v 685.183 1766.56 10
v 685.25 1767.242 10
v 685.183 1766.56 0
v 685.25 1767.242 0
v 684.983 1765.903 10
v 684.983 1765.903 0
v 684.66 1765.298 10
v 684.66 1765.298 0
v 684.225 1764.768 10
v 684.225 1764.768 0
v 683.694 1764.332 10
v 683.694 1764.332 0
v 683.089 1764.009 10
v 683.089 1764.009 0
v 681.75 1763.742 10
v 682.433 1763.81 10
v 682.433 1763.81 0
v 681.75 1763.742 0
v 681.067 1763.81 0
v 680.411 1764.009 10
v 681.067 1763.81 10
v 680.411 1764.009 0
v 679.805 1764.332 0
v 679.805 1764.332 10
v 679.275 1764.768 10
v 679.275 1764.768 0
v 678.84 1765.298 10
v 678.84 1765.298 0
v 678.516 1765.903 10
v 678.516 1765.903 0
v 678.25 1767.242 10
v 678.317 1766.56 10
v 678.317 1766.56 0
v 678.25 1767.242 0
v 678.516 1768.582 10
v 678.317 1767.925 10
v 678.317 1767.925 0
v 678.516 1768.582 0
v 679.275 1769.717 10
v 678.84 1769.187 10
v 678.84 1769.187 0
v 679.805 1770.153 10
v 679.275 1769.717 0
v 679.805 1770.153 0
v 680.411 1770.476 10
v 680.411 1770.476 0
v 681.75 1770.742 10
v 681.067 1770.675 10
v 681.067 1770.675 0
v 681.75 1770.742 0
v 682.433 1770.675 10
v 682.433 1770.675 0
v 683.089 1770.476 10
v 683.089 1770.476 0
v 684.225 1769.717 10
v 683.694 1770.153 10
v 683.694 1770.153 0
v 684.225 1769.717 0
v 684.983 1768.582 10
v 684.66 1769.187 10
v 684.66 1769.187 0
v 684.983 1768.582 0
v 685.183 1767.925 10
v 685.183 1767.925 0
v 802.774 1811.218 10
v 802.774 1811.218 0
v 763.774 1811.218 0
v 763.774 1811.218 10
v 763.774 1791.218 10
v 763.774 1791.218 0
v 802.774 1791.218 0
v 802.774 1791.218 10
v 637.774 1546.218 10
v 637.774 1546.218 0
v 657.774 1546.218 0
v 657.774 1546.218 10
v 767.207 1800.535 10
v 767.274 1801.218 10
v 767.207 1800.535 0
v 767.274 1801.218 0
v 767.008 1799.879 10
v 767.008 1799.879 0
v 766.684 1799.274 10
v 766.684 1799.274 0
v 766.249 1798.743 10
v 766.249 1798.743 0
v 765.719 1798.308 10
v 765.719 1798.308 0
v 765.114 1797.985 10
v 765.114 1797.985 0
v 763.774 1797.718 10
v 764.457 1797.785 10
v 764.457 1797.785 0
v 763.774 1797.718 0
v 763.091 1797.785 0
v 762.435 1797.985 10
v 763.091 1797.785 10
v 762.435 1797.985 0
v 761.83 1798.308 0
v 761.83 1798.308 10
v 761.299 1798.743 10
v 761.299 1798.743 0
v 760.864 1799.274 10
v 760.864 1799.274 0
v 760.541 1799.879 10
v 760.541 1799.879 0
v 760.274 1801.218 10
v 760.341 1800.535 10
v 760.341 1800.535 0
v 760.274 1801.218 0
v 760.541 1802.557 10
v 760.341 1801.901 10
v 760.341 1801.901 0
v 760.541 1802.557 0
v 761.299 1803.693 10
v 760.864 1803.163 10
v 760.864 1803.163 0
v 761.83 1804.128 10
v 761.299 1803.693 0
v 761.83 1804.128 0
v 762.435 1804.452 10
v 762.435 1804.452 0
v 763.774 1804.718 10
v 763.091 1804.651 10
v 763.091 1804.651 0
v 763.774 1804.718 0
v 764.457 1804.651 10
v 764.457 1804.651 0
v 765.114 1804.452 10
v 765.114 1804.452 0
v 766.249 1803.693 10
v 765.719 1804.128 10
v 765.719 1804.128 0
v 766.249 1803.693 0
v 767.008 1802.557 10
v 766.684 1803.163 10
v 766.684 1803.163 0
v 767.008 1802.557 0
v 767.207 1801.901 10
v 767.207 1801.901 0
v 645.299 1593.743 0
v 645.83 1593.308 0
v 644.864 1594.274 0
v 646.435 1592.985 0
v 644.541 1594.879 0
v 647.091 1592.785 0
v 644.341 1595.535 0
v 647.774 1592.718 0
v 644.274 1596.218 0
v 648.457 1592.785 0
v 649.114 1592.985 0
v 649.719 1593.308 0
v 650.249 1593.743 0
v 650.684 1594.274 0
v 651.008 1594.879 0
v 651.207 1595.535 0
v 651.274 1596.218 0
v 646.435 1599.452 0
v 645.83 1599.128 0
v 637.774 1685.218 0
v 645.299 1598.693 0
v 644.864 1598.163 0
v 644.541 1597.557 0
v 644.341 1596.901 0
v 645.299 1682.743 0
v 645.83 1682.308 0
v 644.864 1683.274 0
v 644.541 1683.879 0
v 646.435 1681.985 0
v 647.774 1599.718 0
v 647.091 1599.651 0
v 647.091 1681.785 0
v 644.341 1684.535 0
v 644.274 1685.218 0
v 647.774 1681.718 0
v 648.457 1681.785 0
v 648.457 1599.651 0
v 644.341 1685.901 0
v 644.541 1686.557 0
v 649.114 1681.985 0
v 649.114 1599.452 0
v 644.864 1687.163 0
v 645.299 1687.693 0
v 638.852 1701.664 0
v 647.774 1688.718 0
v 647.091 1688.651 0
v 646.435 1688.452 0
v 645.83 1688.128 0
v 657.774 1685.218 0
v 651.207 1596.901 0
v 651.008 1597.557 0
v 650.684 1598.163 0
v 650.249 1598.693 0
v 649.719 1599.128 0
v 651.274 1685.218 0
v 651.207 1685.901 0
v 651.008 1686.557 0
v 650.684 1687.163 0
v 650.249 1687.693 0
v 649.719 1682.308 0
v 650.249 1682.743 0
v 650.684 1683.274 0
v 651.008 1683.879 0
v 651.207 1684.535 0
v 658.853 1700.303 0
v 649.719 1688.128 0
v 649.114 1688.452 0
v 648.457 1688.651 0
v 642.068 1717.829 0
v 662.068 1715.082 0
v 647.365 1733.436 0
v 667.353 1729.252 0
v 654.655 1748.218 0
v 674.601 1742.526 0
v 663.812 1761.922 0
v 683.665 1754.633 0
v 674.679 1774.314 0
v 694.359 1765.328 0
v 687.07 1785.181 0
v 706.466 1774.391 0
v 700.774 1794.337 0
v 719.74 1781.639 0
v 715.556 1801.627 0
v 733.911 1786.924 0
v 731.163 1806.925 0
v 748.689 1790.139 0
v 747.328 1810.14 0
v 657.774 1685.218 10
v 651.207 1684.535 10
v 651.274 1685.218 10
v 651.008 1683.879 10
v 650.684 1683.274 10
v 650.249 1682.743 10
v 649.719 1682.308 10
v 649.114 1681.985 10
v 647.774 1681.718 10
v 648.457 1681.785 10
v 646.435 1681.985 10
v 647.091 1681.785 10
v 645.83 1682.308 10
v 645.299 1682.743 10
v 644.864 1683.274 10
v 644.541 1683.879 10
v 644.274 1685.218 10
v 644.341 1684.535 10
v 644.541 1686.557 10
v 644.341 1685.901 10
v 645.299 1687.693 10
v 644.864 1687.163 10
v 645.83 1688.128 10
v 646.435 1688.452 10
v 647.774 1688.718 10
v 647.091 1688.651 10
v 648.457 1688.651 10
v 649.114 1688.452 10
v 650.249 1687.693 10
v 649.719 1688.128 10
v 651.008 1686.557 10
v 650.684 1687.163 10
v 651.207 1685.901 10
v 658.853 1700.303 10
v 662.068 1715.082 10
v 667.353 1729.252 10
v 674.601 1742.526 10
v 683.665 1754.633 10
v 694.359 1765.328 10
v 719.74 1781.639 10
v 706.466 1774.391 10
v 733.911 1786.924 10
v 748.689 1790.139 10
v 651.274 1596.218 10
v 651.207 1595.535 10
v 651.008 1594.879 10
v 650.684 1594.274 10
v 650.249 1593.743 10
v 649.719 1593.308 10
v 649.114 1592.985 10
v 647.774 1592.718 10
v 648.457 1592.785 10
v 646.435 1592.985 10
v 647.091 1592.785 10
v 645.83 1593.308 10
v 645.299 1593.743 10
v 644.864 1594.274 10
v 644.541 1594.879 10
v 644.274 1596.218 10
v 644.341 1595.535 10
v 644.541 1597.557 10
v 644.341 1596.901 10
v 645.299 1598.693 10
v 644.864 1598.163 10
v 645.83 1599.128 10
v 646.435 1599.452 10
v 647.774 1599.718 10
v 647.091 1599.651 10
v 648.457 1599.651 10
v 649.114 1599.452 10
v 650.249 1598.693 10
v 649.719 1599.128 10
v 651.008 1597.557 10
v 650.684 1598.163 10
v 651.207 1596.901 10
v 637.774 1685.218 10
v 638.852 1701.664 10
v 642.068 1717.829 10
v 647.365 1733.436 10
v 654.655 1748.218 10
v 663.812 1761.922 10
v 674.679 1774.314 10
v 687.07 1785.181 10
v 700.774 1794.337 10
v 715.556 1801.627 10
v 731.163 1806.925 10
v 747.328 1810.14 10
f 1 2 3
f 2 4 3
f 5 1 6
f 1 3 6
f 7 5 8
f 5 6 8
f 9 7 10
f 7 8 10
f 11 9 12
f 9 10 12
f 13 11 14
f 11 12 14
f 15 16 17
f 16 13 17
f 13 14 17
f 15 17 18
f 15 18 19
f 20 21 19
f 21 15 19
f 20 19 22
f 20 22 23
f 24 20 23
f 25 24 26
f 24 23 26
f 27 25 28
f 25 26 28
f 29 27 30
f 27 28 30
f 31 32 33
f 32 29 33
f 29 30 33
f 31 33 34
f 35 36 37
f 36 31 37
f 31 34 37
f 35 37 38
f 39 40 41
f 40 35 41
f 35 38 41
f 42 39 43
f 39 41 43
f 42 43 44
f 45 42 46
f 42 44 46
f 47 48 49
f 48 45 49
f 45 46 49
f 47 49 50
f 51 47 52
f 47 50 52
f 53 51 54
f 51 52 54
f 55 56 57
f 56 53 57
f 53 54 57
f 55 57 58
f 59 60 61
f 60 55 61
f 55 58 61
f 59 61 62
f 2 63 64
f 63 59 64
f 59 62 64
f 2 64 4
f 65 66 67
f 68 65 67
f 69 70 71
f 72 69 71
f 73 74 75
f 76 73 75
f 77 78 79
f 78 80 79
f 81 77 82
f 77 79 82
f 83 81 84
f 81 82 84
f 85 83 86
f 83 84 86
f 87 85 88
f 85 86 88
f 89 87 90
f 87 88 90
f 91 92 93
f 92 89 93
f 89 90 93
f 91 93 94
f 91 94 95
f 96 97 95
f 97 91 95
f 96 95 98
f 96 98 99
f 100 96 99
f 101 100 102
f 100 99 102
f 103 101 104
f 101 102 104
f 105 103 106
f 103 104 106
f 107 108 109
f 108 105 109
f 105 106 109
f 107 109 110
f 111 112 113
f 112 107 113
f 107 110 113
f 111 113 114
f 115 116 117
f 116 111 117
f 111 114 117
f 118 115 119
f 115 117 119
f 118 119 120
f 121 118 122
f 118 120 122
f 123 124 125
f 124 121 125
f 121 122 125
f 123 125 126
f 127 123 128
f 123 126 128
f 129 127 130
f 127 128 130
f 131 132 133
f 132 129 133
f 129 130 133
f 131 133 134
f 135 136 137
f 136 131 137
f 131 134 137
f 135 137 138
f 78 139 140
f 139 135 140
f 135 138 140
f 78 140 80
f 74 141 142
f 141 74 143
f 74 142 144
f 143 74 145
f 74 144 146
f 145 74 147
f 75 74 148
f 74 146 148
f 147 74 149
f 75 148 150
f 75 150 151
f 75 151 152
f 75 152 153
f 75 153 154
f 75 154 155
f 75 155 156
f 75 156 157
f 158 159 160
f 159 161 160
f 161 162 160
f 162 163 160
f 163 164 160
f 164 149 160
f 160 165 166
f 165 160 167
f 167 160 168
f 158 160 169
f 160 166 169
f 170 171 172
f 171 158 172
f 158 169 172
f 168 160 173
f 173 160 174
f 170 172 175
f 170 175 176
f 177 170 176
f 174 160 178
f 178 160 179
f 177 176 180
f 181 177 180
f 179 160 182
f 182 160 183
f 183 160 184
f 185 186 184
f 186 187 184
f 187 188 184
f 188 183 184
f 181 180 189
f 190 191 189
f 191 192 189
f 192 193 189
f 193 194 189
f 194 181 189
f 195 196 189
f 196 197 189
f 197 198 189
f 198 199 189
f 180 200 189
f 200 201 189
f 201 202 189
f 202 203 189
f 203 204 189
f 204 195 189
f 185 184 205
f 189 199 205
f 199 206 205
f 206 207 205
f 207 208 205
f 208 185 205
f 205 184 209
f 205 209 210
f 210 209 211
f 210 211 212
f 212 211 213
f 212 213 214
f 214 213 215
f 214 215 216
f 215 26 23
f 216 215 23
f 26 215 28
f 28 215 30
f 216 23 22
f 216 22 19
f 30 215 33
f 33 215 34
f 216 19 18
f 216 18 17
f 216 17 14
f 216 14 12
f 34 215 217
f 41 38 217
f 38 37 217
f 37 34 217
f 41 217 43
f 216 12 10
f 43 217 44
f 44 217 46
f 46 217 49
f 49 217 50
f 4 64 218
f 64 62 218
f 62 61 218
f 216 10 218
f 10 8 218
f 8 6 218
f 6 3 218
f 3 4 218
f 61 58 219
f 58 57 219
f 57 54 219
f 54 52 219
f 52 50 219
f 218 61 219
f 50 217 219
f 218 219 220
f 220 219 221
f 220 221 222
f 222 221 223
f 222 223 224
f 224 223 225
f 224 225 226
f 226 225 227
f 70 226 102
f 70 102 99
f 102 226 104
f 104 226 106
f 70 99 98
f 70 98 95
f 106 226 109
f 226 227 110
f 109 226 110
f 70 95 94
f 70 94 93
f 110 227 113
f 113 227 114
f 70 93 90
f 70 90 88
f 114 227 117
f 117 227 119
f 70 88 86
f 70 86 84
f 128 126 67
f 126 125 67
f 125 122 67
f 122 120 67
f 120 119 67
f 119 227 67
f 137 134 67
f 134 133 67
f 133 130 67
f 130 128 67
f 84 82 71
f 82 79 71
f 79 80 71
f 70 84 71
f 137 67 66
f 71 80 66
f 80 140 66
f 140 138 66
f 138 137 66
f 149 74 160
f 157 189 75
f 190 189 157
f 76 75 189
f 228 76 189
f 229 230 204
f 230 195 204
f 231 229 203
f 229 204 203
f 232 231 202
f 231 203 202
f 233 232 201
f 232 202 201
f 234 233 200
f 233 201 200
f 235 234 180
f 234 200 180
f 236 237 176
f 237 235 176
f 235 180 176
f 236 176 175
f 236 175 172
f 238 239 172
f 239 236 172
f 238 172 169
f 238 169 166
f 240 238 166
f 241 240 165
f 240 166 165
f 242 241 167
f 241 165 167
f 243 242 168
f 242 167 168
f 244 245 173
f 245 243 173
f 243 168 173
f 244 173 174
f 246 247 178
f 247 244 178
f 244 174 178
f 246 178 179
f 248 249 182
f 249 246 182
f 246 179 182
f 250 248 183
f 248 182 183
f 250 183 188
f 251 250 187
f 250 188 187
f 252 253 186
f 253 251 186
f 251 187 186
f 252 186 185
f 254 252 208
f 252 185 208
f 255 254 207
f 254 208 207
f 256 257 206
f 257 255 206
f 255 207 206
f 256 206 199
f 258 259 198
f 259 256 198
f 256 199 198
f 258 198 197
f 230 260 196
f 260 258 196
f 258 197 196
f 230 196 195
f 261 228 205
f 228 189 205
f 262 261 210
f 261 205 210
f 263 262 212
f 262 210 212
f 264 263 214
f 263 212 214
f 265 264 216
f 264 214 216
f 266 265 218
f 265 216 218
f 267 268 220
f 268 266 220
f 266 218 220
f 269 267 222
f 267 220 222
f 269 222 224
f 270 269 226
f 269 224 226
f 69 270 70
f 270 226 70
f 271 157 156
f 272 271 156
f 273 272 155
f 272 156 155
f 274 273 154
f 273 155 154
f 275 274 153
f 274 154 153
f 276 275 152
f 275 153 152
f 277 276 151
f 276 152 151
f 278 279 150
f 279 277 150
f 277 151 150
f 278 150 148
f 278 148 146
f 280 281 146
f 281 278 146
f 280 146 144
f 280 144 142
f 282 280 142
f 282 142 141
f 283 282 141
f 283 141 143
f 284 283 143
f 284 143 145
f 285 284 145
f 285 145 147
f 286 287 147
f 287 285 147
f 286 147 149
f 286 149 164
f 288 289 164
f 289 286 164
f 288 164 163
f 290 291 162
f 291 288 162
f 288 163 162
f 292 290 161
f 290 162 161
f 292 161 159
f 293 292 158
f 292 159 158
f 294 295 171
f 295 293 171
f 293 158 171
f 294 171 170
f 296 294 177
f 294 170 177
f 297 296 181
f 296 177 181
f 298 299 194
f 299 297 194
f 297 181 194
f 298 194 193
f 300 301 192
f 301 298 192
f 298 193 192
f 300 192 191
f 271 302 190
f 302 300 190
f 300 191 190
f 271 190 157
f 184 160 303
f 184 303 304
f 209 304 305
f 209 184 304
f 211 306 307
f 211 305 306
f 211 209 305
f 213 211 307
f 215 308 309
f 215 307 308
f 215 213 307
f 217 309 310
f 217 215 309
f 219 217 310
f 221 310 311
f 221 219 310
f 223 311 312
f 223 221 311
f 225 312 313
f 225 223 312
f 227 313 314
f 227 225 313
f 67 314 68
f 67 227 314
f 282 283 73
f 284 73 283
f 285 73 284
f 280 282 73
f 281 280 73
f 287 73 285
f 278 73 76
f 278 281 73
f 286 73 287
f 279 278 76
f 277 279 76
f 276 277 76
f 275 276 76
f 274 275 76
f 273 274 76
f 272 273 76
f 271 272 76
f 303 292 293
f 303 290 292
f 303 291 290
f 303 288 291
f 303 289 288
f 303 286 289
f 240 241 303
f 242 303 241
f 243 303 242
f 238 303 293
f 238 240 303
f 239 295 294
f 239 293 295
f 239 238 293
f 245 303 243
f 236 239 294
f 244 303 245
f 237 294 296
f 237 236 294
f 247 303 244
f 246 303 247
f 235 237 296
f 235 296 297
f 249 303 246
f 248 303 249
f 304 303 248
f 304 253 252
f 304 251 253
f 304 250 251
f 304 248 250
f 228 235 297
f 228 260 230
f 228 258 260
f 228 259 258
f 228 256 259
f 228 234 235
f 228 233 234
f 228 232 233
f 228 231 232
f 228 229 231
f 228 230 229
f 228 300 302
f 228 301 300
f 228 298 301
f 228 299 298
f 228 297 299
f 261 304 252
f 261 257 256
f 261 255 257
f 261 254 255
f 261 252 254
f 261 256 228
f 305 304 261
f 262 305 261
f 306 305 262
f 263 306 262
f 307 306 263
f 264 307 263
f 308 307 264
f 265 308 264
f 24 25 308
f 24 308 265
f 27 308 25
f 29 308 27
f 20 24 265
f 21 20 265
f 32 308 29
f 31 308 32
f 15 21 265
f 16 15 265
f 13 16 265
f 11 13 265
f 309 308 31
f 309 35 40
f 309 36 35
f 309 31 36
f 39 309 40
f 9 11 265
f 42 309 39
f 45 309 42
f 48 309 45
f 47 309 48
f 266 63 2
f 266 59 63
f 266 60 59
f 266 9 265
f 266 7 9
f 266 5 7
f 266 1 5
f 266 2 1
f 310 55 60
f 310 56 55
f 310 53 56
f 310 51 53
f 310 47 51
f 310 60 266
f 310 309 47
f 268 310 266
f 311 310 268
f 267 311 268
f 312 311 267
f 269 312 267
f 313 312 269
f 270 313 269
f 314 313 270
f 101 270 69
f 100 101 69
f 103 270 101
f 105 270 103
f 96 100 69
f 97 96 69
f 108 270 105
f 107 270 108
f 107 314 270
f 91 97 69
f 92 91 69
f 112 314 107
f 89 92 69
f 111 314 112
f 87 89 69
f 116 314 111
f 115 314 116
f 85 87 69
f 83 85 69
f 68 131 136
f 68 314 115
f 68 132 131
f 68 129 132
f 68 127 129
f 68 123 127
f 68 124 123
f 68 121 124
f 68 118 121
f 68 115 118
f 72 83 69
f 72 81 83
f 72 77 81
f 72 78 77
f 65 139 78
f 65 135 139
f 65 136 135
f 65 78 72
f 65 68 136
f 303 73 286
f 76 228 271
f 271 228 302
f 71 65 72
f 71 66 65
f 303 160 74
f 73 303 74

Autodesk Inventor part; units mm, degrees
ref_plane "YZ Plane" through (0, 0, 0) normal (1, 0, 0) x (0, 1, 0)
ref_plane "XZ Plane" through (0, 0, 0) normal (0, 1, 0) x (-1, 0, 0)
ref_plane "XY Plane" through (0, 0, 0) normal (0, 0, 1) x (1, 0, 0)
sketch "Sketch1" plane through (0, 0, 0) normal (0, 0, 1) x (1, 0, 0)
  arc A0 (763.7742, 1811.2181) -> (637.7742, 1685.2181) centre (763.7742, 1685.2181) ccw
  arc A1 (763.7742, 1791.2181) -> (657.7742, 1685.2181) centre (763.7742, 1685.2181) ccw
  line L0 (637.7742, 1546.2181) -> (657.7742, 1546.2181)
  circle A2 centre (763.7742, 1801.2181) radius 3.5
  circle A3 centre (647.7742, 1596.2181) radius 3.5
  circle A4 centre (647.7742, 1685.2181) radius 3.5
  line L1 (802.7742, 1811.2181) -> (802.7742, 1791.2181)
  circle A5 centre (681.7499, 1767.2425) radius 3.5
  line L2 (637.7742, 1685.2181) -> (637.7742, 1546.2181)
  line L3 (657.7742, 1546.2181) -> (657.7742, 1685.2181)
  line L4 (763.7742, 1791.2181) -> (802.7742, 1791.2181)
  line L5 (802.7742, 1811.2181) -> (763.7742, 1811.2181)
  point P0 (0, 0)
extrude "Extrusion1" add sketch "Sketch1" along normal blind 10
properties part number "side_walls"
